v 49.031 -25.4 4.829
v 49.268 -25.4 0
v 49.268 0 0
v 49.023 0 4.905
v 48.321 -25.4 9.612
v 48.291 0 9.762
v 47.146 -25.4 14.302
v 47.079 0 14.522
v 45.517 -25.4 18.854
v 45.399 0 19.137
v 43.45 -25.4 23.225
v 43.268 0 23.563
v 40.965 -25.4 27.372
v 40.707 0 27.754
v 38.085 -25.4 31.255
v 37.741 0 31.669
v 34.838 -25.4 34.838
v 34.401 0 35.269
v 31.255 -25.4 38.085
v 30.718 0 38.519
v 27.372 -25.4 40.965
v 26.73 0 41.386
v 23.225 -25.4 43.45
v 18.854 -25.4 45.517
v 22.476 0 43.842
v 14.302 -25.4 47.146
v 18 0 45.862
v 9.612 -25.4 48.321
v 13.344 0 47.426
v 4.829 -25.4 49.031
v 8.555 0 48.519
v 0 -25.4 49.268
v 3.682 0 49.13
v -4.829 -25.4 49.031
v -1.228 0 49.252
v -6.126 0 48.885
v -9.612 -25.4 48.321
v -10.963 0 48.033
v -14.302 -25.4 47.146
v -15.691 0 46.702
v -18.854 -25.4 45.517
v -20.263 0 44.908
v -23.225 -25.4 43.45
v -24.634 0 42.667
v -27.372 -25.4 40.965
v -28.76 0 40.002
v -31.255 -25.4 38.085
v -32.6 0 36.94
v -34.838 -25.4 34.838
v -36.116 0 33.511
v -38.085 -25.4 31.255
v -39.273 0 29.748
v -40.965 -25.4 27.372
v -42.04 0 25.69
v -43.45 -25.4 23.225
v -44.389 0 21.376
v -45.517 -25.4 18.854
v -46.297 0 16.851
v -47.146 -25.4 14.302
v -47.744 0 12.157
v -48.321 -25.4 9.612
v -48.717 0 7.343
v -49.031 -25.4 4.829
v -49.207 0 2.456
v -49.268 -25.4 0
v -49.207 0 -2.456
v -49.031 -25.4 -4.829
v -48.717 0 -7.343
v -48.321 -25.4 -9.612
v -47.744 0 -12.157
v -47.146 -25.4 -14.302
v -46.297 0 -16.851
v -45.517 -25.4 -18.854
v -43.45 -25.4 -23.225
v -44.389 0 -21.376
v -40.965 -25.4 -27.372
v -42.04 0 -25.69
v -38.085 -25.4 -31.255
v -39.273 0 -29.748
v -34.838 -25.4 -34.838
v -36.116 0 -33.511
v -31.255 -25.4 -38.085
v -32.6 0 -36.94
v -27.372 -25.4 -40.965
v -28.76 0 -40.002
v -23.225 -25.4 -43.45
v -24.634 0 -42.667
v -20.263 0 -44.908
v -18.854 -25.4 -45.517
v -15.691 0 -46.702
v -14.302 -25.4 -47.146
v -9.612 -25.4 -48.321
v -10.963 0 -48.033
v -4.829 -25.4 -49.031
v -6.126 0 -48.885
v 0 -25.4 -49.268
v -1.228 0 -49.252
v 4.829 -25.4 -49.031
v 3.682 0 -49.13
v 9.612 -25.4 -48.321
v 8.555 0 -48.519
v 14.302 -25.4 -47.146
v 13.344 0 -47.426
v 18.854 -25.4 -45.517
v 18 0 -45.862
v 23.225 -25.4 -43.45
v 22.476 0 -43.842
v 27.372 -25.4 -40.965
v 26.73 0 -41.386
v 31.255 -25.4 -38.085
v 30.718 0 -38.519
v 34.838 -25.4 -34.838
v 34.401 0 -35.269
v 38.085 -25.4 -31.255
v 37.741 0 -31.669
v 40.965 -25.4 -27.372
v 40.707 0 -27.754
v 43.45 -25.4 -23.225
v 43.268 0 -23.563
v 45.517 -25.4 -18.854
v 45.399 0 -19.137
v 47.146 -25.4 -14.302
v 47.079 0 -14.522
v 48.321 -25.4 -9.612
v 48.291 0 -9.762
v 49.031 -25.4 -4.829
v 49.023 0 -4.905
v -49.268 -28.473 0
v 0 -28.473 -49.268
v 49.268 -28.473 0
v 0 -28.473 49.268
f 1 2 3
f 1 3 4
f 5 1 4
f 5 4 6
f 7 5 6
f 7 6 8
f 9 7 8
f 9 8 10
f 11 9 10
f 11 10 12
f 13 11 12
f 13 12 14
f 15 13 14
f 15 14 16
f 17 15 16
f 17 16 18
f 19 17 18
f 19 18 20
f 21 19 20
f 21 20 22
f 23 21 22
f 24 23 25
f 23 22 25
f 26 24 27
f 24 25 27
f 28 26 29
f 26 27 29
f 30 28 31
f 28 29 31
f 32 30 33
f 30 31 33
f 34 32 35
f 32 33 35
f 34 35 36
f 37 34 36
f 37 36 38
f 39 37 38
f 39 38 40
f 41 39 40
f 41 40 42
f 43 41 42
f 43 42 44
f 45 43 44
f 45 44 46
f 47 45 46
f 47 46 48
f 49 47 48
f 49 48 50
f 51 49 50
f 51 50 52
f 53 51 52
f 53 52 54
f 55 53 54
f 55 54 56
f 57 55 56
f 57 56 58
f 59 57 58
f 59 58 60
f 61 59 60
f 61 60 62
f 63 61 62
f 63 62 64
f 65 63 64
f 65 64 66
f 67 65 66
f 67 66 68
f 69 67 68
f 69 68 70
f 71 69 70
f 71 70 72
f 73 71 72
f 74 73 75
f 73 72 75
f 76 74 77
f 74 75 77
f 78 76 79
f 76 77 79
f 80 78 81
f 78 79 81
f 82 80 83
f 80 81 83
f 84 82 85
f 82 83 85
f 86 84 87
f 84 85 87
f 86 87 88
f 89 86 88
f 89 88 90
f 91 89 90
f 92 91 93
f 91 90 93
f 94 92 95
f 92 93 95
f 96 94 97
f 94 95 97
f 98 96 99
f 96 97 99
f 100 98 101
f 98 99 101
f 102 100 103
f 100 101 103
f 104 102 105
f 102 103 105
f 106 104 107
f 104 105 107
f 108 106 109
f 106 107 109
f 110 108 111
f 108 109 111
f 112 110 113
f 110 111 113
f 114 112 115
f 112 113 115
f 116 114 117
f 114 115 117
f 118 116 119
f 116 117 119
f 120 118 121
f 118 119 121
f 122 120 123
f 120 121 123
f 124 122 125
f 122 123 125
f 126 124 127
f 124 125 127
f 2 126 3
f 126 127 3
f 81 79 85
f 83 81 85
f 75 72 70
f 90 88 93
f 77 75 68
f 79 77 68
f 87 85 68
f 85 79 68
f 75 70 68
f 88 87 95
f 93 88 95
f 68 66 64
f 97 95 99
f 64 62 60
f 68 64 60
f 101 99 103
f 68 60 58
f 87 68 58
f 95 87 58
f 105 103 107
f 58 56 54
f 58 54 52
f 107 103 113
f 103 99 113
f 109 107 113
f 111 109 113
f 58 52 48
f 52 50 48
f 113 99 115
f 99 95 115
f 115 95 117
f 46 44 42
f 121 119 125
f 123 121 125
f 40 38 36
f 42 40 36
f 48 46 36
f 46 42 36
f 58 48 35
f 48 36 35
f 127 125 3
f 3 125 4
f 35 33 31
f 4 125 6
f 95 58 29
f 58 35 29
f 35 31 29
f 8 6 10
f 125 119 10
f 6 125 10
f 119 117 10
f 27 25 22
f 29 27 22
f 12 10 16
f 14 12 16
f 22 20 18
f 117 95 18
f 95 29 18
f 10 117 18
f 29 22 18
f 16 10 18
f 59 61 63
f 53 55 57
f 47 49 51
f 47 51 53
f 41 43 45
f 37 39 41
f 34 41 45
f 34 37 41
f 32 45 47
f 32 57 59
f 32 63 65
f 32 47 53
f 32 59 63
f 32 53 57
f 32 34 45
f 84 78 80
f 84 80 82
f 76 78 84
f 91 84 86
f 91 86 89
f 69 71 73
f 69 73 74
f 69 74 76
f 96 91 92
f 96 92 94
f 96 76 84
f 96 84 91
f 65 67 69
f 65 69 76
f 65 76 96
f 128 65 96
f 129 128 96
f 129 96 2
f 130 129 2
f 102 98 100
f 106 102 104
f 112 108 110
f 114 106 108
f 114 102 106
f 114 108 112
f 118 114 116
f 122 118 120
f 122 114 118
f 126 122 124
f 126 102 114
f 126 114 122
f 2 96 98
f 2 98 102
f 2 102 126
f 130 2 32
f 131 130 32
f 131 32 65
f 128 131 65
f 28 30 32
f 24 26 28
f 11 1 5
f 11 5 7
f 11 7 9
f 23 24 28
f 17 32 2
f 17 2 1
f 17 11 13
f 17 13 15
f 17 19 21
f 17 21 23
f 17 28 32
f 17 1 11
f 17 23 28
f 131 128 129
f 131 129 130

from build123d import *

# Parameters (mm, degrees)
F0_R     = 49.267776
F1_DEPTH = 25.4
F3_DEPTH = 3.0734


with BuildPart() as f1:
    # F0 (on Front) → F1 (new body)
    with BuildSketch(Plane.XZ):
        Circle(F0_R)
    extrude(amount=F1_DEPTH)

    # F2 (on face) → F3 (join)
    with BuildSketch(Plane.XZ.offset(25.4)):
        Polygon((49.267776, 0), (0, 49.267776), (-49.267776, 0), (0, -49.267776), align=None)
    extrude(amount=F3_DEPTH)


solid = f1.part
